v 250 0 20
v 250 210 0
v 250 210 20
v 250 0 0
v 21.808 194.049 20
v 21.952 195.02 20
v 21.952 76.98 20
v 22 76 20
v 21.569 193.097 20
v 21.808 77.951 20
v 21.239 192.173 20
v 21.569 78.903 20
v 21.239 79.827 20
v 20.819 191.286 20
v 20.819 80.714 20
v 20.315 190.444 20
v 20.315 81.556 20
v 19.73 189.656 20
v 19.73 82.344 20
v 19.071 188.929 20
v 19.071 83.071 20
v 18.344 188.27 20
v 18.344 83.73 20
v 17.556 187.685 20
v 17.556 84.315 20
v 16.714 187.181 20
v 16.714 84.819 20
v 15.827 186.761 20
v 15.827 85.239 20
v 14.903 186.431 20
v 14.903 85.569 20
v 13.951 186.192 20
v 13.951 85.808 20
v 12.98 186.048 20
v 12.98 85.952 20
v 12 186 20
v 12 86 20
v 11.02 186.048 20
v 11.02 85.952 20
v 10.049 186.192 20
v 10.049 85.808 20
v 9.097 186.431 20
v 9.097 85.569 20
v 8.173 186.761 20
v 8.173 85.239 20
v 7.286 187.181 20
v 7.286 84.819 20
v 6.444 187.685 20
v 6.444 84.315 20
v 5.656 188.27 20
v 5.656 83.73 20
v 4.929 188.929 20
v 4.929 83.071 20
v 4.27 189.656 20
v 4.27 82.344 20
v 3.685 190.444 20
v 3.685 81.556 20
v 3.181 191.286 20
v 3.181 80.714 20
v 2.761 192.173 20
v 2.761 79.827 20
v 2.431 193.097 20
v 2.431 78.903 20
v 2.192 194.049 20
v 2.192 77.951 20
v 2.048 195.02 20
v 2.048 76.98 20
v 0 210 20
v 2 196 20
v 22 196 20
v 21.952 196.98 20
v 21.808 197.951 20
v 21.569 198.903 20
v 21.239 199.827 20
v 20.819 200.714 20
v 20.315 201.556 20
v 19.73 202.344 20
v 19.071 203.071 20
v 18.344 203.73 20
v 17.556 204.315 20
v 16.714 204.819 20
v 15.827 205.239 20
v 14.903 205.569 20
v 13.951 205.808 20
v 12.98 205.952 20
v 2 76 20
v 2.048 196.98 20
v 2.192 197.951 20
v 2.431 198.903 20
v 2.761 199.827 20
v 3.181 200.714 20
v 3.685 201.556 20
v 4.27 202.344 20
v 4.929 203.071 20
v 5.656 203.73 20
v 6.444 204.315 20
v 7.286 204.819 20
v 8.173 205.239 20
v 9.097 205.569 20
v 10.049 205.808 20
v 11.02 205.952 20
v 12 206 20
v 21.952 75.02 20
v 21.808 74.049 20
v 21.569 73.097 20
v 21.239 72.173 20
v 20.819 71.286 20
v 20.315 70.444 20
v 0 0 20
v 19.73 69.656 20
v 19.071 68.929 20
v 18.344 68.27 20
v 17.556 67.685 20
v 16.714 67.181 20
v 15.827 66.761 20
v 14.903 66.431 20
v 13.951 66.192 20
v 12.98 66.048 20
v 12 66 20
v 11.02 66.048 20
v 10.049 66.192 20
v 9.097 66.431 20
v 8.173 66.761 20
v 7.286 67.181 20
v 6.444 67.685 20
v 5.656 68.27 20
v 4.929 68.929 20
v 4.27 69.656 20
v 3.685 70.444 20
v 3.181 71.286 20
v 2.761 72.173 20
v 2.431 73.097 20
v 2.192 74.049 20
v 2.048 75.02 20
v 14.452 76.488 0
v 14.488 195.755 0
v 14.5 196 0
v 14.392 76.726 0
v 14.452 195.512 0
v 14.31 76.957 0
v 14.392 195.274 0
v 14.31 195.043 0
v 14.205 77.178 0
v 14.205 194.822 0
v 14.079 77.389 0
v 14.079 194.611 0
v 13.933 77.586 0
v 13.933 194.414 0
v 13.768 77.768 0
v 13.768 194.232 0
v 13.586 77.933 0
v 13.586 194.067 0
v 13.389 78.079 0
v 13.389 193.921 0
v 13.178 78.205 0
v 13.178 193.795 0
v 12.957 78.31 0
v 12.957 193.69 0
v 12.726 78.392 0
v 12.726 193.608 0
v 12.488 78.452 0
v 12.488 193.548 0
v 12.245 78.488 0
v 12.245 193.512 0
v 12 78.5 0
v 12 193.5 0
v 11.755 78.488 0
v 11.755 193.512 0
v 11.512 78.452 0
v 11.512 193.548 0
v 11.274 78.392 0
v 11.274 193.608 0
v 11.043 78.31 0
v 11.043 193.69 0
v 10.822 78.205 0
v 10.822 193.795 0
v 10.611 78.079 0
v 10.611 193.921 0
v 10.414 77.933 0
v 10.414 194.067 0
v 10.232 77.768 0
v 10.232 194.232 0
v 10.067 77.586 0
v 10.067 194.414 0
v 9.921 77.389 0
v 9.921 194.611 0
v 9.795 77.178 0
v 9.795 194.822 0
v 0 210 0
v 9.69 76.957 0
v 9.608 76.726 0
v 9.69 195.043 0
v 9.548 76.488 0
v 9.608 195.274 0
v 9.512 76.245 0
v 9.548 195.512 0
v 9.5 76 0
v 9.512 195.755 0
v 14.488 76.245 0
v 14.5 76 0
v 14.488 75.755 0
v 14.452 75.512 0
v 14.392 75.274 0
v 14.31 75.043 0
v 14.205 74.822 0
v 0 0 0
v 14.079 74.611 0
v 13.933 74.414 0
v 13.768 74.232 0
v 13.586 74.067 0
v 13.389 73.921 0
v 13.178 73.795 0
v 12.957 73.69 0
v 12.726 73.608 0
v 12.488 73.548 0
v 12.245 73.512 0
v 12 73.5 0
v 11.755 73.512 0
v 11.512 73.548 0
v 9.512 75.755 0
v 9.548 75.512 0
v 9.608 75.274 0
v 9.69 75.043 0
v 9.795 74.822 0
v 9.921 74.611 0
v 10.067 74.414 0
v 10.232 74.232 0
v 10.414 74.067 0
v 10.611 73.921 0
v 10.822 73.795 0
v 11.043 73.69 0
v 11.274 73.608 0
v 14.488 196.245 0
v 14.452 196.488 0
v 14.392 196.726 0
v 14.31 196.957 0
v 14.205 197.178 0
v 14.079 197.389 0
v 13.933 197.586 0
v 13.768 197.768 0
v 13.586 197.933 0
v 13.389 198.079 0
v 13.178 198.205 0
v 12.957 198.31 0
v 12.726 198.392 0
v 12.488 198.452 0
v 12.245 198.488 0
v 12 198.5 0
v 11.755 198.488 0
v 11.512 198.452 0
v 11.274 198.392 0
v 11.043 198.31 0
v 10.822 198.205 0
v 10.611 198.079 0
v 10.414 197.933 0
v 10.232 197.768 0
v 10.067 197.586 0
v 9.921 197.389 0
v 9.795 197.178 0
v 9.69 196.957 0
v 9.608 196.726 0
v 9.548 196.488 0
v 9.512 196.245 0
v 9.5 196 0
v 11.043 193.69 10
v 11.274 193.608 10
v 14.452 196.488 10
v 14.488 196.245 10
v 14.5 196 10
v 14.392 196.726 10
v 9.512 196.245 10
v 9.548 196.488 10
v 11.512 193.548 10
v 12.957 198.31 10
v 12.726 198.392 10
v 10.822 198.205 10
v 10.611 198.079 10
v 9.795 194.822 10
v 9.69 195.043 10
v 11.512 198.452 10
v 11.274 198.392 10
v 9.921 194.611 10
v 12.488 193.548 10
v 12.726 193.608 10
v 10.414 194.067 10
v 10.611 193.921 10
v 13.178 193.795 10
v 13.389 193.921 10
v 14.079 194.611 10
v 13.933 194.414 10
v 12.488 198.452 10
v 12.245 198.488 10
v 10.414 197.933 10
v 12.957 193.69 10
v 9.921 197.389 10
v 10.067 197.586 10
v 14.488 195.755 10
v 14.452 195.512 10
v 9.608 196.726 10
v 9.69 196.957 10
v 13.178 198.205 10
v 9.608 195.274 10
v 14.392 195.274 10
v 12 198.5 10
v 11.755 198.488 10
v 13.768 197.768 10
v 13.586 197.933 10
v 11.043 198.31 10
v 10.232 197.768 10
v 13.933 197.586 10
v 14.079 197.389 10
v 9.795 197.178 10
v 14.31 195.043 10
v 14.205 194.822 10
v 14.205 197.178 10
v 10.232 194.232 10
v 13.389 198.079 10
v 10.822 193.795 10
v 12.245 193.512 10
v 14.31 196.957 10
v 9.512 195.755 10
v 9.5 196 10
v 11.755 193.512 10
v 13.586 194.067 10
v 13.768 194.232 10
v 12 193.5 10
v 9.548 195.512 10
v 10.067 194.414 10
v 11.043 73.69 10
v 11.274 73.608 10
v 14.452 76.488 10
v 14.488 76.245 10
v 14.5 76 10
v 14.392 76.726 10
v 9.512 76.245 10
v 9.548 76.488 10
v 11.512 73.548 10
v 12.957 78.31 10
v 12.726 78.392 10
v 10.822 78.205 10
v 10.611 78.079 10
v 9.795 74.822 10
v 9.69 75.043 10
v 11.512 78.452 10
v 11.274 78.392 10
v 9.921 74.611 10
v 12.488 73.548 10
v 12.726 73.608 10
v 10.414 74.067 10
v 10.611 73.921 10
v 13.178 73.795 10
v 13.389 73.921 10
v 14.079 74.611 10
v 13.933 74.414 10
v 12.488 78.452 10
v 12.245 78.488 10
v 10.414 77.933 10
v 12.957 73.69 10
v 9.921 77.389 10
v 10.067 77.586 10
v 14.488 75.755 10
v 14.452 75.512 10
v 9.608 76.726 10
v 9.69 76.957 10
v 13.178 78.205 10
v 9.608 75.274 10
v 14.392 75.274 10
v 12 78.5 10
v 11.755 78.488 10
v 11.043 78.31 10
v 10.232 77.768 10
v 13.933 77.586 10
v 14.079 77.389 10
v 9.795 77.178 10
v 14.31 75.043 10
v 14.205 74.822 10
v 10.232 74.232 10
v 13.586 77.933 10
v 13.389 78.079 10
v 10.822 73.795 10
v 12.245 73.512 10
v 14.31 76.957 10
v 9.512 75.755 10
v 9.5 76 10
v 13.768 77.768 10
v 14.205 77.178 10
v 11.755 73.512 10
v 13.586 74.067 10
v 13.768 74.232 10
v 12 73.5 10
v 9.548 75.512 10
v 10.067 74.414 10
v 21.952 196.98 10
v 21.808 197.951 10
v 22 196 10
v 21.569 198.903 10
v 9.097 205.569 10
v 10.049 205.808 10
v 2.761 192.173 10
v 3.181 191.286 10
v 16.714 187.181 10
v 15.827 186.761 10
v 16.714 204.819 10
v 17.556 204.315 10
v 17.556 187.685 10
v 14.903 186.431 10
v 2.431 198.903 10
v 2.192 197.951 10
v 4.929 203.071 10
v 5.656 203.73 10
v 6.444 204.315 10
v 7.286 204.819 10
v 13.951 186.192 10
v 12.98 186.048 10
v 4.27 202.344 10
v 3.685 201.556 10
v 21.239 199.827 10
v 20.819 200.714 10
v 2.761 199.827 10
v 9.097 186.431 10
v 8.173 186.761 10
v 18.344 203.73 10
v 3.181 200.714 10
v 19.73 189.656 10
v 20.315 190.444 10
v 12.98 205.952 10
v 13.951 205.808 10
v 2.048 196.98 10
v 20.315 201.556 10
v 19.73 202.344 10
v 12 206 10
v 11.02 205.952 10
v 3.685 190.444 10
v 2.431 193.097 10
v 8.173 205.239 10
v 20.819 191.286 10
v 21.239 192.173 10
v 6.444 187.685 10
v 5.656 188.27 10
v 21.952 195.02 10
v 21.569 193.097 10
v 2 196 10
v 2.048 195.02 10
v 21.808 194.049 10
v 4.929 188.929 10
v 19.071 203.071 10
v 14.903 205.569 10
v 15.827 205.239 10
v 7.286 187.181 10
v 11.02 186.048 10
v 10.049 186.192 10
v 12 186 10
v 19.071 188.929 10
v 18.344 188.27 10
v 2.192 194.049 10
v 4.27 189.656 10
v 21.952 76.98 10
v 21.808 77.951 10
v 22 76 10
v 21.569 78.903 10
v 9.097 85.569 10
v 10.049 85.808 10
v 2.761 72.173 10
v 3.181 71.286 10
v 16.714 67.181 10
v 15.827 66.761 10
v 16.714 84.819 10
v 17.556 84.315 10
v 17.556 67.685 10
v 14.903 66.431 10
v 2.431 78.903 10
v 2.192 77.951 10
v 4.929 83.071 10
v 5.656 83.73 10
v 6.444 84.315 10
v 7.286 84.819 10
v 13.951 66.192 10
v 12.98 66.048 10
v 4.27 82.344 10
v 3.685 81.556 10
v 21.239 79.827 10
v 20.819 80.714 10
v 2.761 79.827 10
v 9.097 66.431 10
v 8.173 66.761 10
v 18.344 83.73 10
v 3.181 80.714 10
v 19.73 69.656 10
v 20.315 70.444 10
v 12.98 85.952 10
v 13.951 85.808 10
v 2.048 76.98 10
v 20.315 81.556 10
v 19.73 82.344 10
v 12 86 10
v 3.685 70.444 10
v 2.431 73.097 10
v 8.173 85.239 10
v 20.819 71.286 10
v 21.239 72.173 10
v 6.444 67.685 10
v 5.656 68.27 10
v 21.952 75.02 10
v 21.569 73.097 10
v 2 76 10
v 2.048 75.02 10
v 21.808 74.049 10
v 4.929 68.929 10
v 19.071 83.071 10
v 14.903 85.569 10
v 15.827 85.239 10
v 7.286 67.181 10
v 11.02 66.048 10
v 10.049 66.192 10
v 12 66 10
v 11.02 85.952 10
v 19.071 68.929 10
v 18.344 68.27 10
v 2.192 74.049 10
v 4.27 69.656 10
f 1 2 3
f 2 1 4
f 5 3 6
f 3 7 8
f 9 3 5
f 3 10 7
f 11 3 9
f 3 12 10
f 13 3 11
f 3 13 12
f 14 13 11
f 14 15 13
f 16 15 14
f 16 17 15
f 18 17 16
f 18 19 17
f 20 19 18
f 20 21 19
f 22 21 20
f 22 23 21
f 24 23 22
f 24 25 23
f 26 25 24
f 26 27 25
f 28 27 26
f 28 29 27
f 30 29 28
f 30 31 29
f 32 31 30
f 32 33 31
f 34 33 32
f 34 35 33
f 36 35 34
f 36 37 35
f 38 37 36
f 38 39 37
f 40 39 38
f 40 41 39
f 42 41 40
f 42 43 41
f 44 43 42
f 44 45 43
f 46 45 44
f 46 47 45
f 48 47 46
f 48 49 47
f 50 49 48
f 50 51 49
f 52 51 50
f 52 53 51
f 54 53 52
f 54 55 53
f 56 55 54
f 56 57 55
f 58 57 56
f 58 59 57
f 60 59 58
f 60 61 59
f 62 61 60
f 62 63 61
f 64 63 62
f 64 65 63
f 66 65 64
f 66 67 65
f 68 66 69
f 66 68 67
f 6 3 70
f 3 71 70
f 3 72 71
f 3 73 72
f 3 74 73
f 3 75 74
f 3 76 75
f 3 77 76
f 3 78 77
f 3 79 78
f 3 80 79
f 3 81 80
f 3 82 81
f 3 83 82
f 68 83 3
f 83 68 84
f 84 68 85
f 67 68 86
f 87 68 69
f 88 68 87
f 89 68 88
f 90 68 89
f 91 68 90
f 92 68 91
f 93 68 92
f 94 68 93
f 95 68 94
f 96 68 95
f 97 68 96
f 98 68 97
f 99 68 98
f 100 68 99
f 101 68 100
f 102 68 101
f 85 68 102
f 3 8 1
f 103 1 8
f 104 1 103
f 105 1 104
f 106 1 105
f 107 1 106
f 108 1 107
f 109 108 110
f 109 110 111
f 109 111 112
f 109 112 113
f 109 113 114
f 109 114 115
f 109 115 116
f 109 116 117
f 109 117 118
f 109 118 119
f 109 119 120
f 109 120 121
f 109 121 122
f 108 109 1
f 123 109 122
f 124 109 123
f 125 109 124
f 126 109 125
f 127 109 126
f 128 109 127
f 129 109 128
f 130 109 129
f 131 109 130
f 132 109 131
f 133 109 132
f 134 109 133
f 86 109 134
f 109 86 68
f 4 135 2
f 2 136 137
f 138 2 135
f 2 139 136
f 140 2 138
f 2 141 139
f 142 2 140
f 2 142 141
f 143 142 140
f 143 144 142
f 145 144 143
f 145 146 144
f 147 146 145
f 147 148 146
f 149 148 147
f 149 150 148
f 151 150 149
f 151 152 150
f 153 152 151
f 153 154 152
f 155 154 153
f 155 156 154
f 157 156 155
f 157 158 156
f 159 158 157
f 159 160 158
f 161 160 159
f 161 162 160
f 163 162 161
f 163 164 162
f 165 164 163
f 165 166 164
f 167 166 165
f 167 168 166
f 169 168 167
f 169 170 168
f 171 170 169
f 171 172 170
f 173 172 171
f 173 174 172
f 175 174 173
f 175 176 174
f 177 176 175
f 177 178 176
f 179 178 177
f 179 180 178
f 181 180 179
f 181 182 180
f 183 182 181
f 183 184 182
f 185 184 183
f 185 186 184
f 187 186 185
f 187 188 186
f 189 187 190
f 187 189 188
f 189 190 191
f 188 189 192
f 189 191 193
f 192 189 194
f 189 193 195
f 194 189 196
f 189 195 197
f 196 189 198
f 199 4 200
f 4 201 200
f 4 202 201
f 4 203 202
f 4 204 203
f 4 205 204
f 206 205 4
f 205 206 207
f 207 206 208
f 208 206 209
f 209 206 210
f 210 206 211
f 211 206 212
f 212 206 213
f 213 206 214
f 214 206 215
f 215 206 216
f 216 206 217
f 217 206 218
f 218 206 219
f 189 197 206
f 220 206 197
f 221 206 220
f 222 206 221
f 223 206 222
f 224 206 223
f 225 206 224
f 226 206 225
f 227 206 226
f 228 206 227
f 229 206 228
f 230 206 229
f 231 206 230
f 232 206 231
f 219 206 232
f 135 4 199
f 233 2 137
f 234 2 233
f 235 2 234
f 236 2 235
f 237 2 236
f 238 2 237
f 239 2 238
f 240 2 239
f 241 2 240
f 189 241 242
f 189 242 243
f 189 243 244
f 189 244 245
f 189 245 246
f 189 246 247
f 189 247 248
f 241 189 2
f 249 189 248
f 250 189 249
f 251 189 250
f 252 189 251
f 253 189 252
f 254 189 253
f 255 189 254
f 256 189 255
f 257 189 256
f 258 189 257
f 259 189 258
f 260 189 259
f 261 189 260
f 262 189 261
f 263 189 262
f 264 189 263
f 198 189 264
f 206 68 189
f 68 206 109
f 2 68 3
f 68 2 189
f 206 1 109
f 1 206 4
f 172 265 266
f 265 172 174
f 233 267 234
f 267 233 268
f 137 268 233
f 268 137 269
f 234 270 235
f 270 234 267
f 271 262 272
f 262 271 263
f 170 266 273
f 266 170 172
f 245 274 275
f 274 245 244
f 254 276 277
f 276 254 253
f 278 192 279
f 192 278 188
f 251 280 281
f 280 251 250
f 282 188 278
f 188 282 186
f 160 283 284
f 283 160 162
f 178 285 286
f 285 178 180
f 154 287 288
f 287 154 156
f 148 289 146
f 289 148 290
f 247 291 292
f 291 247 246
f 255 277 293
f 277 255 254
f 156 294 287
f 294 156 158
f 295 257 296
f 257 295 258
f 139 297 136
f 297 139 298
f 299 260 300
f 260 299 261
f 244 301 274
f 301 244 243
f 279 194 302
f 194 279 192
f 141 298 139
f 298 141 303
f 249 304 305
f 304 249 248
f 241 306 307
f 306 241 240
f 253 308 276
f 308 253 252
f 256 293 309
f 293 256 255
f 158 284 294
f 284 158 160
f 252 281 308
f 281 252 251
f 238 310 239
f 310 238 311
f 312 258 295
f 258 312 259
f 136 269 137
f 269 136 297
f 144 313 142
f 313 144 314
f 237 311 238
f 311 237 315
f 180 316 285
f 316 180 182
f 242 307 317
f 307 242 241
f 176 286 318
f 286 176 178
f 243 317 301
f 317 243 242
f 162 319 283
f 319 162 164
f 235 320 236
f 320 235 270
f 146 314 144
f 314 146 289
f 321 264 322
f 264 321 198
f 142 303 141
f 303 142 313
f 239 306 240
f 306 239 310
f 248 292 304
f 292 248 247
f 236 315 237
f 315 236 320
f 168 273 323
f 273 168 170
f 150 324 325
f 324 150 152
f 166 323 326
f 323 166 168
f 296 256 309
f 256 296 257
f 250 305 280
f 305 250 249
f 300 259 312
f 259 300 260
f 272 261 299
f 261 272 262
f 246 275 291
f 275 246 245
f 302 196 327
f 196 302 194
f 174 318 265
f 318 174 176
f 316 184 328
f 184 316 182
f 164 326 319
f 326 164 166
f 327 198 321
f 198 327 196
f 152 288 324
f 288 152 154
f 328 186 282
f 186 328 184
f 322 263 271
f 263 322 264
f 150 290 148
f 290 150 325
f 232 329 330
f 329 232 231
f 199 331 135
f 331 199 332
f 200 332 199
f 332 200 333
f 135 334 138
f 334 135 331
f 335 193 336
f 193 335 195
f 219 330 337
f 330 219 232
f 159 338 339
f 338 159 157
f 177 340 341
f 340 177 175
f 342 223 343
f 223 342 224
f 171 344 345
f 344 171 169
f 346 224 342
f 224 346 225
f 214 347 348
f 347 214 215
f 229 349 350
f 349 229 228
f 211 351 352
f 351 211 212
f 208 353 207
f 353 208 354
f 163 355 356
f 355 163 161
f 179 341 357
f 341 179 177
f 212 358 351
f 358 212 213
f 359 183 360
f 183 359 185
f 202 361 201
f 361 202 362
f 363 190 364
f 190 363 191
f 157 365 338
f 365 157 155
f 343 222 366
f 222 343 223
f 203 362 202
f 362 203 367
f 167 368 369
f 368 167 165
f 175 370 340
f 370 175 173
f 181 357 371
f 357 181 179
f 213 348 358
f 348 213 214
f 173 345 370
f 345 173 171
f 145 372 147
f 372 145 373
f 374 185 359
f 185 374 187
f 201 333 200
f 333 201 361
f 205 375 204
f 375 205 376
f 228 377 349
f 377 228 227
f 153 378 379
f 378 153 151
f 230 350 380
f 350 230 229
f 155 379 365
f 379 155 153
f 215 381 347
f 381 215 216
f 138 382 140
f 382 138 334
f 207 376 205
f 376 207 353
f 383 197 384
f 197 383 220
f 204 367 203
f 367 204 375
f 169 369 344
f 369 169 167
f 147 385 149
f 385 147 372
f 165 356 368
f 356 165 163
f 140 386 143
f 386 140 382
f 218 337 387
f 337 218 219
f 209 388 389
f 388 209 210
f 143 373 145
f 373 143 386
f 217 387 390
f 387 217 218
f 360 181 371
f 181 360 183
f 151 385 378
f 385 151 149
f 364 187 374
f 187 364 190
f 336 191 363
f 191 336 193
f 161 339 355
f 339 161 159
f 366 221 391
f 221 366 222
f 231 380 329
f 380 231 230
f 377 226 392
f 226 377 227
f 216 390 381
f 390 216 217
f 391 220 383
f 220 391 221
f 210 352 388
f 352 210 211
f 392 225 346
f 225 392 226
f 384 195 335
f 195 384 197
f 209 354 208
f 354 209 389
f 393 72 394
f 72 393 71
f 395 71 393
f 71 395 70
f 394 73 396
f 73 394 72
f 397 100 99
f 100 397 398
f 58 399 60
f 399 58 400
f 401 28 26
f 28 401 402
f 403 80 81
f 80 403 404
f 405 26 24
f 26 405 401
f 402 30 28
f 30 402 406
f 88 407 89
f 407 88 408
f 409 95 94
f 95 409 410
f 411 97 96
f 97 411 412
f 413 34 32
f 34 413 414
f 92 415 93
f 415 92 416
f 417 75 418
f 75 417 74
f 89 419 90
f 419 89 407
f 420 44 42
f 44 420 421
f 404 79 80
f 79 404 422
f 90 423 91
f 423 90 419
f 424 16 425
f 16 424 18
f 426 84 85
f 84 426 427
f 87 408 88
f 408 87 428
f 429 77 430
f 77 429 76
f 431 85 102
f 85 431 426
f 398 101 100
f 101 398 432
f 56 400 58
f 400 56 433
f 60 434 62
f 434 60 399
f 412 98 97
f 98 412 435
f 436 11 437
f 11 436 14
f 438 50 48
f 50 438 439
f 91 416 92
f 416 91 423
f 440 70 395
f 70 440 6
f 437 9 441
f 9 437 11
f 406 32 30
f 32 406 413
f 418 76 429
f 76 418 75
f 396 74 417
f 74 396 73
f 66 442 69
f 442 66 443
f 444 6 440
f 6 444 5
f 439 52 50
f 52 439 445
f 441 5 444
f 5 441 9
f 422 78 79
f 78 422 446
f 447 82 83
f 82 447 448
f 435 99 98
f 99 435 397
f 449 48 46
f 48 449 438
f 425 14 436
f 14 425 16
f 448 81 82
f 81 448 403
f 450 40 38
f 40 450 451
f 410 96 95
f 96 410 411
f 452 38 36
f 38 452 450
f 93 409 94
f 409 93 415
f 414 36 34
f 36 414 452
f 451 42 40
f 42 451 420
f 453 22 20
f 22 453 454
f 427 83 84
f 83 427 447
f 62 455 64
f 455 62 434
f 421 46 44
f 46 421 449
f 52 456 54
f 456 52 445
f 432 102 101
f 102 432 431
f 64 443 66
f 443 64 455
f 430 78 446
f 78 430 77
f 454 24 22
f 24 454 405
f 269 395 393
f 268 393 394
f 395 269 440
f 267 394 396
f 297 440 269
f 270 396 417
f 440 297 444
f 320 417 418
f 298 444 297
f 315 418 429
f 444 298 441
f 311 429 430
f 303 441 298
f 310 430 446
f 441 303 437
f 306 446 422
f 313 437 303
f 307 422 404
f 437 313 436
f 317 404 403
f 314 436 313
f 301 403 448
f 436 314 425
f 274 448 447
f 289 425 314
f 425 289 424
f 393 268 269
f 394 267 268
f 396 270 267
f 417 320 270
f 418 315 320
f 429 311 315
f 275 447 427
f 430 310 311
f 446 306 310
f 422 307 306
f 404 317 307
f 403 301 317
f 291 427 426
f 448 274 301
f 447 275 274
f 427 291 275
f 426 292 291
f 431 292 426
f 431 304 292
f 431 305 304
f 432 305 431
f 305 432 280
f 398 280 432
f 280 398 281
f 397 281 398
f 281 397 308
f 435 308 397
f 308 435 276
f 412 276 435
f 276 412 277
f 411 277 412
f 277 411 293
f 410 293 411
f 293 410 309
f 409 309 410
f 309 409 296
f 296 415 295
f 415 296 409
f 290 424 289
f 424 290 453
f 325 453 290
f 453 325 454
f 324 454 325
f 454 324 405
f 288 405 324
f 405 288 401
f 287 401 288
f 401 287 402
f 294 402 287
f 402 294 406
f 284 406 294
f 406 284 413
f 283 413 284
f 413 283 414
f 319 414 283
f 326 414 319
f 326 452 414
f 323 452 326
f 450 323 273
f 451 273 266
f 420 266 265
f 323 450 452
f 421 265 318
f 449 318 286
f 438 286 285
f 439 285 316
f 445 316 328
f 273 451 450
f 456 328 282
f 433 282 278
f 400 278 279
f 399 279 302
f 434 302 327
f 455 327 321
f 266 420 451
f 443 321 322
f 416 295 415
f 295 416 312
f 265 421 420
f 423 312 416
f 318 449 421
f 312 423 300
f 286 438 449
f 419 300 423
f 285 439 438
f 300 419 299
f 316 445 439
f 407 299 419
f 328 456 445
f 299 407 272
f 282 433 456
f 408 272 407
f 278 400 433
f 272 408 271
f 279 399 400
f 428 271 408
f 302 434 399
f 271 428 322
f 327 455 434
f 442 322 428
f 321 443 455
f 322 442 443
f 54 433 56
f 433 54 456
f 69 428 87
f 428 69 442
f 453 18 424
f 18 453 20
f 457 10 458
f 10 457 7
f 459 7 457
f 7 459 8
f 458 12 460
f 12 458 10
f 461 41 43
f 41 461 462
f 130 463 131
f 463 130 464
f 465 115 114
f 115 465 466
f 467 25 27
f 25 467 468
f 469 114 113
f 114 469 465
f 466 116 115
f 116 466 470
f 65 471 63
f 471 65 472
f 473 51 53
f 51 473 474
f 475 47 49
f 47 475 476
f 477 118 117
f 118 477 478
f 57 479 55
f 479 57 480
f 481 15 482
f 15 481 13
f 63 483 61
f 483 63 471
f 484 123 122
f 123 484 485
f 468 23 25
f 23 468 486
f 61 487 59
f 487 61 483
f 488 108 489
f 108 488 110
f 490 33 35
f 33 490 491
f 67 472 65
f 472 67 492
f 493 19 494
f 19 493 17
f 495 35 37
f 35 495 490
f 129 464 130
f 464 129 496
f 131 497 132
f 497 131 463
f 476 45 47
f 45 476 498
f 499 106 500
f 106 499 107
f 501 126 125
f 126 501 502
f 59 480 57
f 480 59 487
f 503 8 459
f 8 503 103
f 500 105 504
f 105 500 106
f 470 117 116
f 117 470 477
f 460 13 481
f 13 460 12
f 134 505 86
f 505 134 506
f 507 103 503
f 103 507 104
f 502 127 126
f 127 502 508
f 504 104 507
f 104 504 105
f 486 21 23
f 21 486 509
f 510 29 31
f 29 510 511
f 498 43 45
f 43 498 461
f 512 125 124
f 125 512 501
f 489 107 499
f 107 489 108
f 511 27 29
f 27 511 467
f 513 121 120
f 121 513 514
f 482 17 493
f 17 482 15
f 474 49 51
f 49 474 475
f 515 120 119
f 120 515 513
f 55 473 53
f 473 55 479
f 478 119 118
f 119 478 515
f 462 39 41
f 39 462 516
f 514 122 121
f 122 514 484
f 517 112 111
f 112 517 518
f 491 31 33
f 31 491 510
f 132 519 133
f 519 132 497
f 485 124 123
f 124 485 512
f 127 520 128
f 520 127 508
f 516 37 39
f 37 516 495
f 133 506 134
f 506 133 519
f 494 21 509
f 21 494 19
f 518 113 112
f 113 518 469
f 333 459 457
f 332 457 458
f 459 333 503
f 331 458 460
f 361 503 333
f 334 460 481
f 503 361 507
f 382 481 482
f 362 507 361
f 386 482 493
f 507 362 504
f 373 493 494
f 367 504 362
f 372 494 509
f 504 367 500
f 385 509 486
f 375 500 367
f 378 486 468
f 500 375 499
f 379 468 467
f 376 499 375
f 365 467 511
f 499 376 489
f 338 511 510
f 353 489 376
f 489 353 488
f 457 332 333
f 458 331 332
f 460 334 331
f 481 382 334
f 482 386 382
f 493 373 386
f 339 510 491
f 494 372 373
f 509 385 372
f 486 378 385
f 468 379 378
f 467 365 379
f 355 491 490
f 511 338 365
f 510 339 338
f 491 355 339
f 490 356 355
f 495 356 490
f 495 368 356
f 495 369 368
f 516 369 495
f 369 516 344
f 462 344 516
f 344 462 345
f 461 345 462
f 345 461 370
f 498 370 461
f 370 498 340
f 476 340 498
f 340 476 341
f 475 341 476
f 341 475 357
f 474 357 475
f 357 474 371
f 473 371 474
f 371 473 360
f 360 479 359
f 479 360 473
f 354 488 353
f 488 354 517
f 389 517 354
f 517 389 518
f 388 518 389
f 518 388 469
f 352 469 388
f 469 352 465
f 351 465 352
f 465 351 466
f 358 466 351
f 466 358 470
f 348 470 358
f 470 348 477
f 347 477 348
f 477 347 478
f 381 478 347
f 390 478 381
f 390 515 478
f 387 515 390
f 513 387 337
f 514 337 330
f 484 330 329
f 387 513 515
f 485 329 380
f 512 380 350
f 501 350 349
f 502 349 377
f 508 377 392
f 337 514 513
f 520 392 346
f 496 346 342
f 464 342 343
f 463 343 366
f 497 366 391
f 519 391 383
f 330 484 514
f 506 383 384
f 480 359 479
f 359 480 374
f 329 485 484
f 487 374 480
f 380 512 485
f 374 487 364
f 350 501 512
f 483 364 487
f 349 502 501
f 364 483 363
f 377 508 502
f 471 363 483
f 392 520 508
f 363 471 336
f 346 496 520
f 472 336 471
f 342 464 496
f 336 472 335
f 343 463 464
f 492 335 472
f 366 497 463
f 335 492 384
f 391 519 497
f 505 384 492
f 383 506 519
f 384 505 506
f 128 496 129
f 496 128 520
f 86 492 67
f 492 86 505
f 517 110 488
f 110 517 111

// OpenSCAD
$fn = 64;
WideX=250;
ThickZ=20;
DeepY=210;
Buff=1;
ScrewDia=5;
ScrewheadDia=20;
ScrewHeadR=ScrewheadDia/2;
HoleDist=120;
DB=Buff*2;
Hole1=DeepY-ScrewHeadR-DB-DB;
Hole2=Hole1-HoleDist;

HalfThick=ThickZ/2;

difference()
{
  cube([WideX,DeepY,ThickZ]);
  translate([ScrewHeadR+DB,Hole1,-Buff]) rotate([0,0,0]) cylinder(h=ThickZ+DB,d=ScrewDia);
  translate([ScrewHeadR+DB,Hole2,-Buff])rotate([0,0,0]) cylinder(h=ThickZ+DB,d=ScrewDia);  
  translate([ScrewHeadR+DB,Hole1,HalfThick]) rotate([0,0,0]) cylinder(h=HalfThick+DB,d=ScrewheadDia);
  translate([ScrewHeadR+DB,Hole2,HalfThick])rotate([0,0,0]) cylinder(h=HalfThick+DB,d=ScrewheadDia);  
}
